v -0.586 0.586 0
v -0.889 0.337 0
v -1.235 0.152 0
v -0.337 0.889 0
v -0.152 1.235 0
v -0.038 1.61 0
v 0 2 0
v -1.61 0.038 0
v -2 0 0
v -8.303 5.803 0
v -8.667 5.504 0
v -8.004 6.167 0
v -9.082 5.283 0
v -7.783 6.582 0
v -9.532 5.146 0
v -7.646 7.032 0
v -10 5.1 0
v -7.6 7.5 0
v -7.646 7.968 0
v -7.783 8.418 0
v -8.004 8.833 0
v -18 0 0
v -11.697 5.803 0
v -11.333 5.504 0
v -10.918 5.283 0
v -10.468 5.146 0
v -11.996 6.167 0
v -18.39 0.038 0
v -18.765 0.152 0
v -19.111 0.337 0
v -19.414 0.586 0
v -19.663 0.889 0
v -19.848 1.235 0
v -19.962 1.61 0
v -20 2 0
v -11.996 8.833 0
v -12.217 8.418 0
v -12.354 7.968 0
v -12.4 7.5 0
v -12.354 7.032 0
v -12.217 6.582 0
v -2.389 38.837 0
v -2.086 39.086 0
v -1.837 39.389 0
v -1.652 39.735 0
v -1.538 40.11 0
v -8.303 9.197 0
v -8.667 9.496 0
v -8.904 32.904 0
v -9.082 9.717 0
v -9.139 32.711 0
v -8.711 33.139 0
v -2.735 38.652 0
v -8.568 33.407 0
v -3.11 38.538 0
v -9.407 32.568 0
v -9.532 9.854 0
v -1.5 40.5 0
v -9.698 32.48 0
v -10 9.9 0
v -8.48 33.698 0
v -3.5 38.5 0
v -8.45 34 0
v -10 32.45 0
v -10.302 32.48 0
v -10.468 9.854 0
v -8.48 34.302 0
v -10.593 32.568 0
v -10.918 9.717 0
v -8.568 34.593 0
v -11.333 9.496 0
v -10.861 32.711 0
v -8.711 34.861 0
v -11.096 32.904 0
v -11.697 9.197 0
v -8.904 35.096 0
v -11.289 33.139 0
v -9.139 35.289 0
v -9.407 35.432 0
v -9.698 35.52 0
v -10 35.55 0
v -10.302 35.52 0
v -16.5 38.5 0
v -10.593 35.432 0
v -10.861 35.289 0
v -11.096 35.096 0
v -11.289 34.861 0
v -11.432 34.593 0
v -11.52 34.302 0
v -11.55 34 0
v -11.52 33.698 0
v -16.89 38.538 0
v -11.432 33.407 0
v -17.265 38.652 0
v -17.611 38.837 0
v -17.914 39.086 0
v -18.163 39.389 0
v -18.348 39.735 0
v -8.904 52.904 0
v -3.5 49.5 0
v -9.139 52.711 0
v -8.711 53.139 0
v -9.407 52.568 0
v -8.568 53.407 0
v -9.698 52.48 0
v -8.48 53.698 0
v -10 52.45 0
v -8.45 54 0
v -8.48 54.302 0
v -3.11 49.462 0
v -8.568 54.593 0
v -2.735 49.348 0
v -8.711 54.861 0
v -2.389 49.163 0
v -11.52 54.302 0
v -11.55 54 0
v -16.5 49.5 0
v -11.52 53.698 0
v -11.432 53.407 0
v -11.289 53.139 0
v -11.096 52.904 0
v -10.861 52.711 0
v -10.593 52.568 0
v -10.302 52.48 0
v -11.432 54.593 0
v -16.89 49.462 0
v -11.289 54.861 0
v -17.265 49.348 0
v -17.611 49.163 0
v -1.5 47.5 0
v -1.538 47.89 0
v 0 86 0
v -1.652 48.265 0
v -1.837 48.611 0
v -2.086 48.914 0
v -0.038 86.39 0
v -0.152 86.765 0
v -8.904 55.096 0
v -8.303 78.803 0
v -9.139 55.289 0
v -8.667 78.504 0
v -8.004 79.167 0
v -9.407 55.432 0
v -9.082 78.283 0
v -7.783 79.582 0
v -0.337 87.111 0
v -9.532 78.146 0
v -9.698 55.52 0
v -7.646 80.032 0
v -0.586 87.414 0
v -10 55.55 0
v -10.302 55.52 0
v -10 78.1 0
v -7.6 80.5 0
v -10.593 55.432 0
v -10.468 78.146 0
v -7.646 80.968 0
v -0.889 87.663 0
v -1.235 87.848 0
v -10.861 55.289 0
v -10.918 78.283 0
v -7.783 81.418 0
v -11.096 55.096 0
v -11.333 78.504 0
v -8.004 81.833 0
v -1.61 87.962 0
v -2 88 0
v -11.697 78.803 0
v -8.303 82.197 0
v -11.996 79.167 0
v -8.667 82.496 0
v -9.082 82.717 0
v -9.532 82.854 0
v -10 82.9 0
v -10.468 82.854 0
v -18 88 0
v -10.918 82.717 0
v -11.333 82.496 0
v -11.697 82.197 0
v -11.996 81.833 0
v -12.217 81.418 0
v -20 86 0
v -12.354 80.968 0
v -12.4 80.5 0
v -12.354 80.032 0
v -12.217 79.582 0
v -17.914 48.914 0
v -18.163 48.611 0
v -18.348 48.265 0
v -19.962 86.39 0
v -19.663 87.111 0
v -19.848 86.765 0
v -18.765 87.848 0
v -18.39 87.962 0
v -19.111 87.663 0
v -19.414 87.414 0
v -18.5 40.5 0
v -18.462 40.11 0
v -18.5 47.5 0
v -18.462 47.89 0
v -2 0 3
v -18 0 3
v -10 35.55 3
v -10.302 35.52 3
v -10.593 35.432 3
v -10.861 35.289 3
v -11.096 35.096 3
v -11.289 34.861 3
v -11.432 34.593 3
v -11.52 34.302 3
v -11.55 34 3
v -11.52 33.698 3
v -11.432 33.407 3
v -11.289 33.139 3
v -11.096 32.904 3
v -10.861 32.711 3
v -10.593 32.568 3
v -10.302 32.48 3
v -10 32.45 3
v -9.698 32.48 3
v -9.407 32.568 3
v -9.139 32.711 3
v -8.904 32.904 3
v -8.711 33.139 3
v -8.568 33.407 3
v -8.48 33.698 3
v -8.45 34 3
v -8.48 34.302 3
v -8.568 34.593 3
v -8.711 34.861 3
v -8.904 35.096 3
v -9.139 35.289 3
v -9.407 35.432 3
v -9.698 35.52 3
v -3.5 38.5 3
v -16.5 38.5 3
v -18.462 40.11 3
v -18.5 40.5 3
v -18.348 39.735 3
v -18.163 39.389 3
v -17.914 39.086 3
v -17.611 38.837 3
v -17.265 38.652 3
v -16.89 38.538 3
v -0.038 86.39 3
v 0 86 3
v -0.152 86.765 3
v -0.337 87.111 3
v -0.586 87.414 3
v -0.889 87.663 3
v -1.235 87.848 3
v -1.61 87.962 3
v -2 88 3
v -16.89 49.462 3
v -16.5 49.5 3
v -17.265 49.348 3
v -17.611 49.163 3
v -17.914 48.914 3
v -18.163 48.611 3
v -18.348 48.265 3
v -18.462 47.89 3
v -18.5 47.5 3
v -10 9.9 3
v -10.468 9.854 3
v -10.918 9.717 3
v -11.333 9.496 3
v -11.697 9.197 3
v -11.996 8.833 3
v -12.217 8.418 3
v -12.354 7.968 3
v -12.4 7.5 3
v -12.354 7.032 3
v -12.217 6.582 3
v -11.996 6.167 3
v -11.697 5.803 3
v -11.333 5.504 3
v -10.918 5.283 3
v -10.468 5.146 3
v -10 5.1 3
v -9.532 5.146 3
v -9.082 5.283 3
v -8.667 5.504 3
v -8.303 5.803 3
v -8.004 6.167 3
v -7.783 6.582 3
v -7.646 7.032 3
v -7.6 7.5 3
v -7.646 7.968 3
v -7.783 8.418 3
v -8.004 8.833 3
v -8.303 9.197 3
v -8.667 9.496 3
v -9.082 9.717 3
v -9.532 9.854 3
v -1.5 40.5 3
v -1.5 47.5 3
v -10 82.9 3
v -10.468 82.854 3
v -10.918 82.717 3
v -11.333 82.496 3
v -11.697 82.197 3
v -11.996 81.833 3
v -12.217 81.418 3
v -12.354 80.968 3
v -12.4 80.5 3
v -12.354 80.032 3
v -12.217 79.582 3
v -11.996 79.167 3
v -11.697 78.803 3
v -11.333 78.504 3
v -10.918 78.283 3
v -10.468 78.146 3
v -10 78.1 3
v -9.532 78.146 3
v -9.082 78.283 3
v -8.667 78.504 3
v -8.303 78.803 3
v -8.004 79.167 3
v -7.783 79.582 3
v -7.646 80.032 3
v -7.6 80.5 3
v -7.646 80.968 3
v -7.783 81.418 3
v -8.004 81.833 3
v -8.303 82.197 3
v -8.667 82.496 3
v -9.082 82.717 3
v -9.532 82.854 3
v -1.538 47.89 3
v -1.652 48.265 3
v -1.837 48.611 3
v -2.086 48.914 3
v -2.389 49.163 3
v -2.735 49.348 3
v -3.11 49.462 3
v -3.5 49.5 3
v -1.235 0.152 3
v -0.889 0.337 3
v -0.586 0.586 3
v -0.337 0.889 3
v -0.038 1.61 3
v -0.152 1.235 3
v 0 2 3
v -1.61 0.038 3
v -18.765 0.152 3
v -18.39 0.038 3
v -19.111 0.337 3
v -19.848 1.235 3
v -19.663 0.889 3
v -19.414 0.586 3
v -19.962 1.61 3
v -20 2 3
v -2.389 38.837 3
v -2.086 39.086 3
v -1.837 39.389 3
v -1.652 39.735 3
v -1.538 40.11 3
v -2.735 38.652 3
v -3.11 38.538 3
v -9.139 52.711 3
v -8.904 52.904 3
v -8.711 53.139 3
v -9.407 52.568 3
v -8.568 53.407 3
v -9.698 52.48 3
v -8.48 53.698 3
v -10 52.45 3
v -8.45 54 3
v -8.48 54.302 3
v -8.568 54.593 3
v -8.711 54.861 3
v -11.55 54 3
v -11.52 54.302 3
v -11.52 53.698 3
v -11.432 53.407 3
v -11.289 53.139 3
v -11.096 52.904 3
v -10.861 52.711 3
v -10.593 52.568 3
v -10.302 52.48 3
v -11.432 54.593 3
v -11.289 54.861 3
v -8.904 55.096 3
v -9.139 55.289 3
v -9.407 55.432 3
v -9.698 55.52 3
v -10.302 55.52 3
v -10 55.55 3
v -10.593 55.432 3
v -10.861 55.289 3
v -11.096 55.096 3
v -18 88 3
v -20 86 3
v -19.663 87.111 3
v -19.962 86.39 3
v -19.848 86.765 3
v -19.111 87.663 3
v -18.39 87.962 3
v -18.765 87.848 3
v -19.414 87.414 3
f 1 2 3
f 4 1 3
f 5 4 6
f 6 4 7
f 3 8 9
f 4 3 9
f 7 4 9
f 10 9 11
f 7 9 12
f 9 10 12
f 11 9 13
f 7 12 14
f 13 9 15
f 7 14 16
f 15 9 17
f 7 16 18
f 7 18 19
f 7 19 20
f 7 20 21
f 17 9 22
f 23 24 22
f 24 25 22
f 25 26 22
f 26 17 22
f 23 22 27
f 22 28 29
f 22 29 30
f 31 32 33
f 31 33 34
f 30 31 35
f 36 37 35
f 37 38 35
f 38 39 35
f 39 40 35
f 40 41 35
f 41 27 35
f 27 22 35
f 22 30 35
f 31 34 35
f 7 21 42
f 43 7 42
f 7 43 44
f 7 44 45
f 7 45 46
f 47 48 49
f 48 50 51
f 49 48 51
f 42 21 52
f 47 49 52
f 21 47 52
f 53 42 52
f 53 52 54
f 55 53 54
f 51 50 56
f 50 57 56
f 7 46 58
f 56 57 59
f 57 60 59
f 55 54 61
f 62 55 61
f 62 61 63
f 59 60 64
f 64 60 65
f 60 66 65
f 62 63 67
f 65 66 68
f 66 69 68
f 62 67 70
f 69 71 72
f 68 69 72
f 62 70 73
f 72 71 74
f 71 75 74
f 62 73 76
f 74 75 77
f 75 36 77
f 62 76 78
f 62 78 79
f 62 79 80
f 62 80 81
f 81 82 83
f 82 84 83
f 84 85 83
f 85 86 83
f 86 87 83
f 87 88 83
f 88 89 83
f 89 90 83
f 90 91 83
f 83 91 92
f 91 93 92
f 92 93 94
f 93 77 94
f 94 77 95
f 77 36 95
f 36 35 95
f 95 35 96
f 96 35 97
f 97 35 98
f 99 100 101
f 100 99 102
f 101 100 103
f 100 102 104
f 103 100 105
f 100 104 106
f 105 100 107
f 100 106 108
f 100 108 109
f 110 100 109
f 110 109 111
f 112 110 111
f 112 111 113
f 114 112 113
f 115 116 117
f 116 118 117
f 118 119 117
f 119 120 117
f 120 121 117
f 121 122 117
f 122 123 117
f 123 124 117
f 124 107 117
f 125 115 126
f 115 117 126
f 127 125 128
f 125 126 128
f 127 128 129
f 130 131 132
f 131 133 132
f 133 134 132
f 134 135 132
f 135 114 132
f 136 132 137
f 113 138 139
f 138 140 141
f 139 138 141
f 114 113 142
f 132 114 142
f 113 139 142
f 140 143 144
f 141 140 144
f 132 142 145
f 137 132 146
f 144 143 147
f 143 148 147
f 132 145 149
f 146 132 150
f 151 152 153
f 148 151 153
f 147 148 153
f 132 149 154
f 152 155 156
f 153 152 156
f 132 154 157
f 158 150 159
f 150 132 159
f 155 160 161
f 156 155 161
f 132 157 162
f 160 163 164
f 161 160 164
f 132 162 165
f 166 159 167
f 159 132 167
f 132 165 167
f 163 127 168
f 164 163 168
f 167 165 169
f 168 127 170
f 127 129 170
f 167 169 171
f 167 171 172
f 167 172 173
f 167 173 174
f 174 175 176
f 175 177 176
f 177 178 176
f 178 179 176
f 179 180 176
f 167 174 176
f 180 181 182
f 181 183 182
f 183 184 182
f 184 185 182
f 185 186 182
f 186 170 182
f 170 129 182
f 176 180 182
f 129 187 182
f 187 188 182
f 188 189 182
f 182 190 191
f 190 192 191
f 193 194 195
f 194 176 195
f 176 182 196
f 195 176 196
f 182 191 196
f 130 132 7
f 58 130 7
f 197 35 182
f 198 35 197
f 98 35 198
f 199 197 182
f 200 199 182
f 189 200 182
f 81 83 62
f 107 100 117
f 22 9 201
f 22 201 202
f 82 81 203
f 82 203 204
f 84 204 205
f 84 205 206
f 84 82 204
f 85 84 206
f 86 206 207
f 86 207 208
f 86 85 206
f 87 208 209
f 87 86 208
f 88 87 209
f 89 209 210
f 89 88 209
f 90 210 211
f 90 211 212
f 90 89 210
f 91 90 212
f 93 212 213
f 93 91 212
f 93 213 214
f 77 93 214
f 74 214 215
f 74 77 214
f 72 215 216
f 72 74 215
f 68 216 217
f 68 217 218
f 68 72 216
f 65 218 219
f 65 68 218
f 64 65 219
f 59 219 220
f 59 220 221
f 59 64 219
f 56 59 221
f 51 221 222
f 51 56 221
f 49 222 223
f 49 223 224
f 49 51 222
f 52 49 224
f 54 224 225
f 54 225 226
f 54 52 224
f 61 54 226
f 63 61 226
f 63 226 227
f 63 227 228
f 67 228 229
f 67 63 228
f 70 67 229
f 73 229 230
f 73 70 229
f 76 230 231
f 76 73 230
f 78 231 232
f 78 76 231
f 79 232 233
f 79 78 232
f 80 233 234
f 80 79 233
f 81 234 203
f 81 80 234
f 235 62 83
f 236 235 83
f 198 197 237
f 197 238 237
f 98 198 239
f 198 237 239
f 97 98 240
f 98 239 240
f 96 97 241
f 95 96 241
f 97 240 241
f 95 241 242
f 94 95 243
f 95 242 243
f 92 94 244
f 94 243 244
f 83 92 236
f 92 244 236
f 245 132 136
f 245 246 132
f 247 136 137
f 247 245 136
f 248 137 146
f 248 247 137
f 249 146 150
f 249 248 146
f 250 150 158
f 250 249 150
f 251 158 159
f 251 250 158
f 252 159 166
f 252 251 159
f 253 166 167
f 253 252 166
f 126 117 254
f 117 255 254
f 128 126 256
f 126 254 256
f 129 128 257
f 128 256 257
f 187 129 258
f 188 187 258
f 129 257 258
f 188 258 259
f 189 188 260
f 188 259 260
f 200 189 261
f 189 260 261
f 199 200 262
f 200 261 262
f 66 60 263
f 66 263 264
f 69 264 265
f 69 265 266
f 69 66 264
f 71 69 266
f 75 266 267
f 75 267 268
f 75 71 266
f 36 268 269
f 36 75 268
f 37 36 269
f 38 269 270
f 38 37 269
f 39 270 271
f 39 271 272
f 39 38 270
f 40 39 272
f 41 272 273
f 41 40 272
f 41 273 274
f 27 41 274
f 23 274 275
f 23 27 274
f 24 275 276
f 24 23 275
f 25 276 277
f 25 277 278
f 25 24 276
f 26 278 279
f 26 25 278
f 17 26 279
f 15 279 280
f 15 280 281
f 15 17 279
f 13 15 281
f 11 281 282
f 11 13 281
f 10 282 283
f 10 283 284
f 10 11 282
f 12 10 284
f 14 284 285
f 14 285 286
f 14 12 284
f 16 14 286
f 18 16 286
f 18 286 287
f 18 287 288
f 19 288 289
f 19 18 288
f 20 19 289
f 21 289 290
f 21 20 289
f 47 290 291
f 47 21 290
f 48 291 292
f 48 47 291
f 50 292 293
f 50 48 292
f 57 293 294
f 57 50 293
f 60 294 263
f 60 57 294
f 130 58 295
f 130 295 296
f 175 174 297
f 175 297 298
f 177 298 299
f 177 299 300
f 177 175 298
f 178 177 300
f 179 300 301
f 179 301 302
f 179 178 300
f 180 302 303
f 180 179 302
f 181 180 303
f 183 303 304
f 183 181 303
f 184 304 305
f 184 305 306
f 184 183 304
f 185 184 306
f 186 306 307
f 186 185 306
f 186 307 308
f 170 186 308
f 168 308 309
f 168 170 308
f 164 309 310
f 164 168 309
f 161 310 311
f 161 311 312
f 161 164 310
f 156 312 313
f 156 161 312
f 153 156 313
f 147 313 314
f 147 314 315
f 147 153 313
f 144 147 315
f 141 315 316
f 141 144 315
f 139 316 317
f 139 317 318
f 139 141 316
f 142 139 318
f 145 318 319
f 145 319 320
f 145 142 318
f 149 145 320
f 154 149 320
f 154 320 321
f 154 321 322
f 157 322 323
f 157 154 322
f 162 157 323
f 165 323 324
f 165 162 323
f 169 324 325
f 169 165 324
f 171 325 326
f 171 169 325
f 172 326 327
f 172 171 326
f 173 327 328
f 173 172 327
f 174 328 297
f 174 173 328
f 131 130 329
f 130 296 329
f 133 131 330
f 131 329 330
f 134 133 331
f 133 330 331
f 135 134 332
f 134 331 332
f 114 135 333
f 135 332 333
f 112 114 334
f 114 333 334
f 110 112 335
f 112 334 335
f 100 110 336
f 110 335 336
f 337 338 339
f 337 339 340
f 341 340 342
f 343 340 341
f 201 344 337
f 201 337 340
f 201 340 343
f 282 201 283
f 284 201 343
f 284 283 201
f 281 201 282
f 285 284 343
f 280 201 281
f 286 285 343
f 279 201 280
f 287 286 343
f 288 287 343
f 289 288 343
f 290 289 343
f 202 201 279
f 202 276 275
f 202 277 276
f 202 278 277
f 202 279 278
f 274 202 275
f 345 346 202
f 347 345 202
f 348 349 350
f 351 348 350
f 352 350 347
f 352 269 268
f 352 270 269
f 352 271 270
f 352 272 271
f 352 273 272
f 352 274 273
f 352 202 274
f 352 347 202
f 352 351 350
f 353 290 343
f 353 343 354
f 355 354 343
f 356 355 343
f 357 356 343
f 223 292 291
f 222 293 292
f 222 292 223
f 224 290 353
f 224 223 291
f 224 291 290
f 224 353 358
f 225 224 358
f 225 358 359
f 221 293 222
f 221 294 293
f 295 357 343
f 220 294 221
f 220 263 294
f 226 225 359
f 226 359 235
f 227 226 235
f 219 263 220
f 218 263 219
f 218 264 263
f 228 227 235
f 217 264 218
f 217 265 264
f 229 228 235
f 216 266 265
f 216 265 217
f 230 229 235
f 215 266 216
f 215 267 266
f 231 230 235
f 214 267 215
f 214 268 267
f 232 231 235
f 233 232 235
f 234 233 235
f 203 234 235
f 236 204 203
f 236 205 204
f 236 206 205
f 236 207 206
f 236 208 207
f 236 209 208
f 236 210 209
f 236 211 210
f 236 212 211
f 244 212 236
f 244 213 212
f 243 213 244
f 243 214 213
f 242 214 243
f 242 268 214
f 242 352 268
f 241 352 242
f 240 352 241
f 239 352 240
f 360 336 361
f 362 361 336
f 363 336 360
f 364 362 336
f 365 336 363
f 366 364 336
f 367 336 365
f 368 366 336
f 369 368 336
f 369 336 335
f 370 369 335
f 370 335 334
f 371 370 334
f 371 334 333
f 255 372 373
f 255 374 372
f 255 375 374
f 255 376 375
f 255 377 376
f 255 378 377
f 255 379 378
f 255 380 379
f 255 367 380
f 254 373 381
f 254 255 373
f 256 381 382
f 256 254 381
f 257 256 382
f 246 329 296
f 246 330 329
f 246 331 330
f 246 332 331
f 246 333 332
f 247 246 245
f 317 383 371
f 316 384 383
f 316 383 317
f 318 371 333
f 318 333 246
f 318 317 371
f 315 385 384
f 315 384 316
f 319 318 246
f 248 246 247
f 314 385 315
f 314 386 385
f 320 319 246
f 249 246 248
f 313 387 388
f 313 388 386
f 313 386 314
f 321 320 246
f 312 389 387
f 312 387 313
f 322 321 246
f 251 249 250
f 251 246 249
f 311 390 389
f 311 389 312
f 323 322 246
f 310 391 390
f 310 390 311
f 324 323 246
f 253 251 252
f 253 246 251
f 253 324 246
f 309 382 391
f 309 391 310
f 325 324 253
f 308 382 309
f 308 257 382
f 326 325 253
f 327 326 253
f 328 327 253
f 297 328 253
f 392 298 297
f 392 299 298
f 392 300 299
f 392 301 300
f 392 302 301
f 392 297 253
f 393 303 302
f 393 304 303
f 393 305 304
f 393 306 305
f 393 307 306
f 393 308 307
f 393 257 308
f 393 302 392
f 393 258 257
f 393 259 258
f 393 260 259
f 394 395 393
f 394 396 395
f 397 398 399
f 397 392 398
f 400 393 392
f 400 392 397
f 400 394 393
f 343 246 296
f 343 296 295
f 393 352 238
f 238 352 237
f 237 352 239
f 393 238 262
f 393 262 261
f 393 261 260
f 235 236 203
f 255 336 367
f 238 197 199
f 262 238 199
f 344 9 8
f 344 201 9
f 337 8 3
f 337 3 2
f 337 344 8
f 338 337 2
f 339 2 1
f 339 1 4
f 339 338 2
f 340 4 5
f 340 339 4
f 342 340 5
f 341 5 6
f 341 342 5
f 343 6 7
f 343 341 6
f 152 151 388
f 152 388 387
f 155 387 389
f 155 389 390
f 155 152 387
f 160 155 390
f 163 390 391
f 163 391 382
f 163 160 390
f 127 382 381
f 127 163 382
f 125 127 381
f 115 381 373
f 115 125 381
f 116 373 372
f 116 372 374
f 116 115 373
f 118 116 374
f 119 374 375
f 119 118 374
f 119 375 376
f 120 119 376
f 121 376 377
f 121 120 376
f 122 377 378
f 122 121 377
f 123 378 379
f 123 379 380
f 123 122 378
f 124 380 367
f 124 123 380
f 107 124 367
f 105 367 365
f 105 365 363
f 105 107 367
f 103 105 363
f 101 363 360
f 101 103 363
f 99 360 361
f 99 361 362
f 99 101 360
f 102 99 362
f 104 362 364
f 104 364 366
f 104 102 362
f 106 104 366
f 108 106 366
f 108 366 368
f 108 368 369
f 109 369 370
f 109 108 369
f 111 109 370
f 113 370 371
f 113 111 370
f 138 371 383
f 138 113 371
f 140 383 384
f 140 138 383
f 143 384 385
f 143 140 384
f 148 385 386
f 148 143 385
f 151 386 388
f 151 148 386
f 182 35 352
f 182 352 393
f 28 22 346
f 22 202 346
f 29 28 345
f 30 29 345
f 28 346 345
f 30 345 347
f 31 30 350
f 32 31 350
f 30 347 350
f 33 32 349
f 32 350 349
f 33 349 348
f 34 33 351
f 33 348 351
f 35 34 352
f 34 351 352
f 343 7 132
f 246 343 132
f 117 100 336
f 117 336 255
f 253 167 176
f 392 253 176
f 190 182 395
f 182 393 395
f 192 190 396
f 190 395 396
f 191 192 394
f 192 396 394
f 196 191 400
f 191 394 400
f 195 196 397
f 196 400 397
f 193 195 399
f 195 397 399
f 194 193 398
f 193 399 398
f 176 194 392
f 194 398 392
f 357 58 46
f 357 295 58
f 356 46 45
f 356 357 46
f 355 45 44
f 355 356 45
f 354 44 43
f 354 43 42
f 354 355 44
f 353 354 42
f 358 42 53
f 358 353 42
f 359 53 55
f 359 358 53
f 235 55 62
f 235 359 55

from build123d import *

# Parameters (mm, degrees)
SKETCH_1_W      = 88
SKETCH_1_H      = 20
SKETCH_1_R      = 2.4
SKETCH_1_R_2    = 1.55
SKETCH_1_W_2    = 11
SKETCH_1_H_2    = 17
EXTRUDE_1_DEPTH = 3
FILLET_1_R      = 2


with BuildPart() as part:
    # ｽｹｯﾁ1 → ﾎﾞｽ - 押し出し1 (new body)
    with BuildSketch(Plane(origin=(0, 0, 0), x_dir=(0, 1, 0), z_dir=(0, 0, 1))):
        with Locations((44, 10)):
            Rectangle(SKETCH_1_W, SKETCH_1_H)
        with Locations((7.5, 10)):
            Circle(SKETCH_1_R, mode=Mode.SUBTRACT)
        with Locations((80.5, 10)):
            Circle(SKETCH_1_R, mode=Mode.SUBTRACT)
        with Locations((54, 10)):
            Circle(SKETCH_1_R_2, mode=Mode.SUBTRACT)
        with Locations((34, 10)):
            Circle(SKETCH_1_R_2, mode=Mode.SUBTRACT)
        with Locations((44, 10)):
            Rectangle(SKETCH_1_W_2, SKETCH_1_H_2, mode=Mode.SUBTRACT)
    extrude(amount=EXTRUDE_1_DEPTH)

    # ﾌｨﾚｯﾄ1
    fillet_1_edges = [part.edges().sort_by_distance(p)[0] for p in [
        (-1.5, 49.5, 1.5),
        (-18.5, 49.5, 1.5),
        (-18.5, 38.5, 1.5),
        (-1.5, 38.5, 1.5),
        (-20, 0, 1.5),
        (-20, 88, 1.5),
        (0, 88, 1.5),
        (0, 0, 1.5),
    ]]
    fillet(fillet_1_edges, radius=FILLET_1_R)


solid = part.part
